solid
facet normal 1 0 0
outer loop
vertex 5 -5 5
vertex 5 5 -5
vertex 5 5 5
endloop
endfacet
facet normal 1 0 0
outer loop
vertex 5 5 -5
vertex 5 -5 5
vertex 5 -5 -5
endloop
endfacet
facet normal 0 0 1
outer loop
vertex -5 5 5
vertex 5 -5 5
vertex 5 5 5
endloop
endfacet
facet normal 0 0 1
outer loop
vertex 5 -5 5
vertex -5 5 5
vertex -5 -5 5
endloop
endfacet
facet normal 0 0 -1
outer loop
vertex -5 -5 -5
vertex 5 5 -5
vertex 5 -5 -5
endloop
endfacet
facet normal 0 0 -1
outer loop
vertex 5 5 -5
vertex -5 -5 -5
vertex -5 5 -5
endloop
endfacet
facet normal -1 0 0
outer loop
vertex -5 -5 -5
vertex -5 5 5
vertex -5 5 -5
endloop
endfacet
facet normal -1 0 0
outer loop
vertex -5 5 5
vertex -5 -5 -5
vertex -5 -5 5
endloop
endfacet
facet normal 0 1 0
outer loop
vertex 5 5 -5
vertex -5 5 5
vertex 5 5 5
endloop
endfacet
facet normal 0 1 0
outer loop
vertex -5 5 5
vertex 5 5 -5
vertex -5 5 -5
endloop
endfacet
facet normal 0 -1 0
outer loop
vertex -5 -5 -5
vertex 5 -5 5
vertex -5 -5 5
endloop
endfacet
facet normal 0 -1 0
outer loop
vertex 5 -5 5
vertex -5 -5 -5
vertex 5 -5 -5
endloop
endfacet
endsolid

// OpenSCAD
// Begin.
union() {
union() {
union() {
difference() {
union() {
translate([0, 0, 0])
sphere(r = 57, $fn = 12);

translate([0, 0, 0])
sphere(r = 57, $fn = 12);
}

union() {
translate([0, 0, 0])
sphere(r = 57, $fn = 12);

translate([0, 0, 0])
sphere(r = 57, $fn = 12);
}
}

intersection() {
difference() {
translate([0, 0, 0])
sphere(r = 57, $fn = 12);

translate([0, 0, 0])
sphere(r = 57, $fn = 12);
}

translate([0, 0, 0])
sphere(r = 57, $fn = 12);
}
}

difference() {
union() {
difference() {
translate([0, 0, 0])
sphere(r = 57, $fn = 12);

translate([0, 0, 0])
sphere(r = 57, $fn = 12);
}

intersection() {
rotate([0, -0, 0])
translate([0, 0, 0])
cube(size = [10, 10, 10], center = true);

translate([0, 0, 0])
sphere(r = 57, $fn = 12);
}
}

intersection() {
translate([0, 0, 0])
sphere(r = 57, $fn = 12);

rotate([0, -0, 0])
translate([0, 0, 12])
cube(size = [38, 10, 14], center = true);
}
}
}

difference() {
translate([0, 0, 0])
sphere(r = 57, $fn = 12);

translate([0, 0, 0])
sphere(r = 57, $fn = 12);
}
}
// End.
